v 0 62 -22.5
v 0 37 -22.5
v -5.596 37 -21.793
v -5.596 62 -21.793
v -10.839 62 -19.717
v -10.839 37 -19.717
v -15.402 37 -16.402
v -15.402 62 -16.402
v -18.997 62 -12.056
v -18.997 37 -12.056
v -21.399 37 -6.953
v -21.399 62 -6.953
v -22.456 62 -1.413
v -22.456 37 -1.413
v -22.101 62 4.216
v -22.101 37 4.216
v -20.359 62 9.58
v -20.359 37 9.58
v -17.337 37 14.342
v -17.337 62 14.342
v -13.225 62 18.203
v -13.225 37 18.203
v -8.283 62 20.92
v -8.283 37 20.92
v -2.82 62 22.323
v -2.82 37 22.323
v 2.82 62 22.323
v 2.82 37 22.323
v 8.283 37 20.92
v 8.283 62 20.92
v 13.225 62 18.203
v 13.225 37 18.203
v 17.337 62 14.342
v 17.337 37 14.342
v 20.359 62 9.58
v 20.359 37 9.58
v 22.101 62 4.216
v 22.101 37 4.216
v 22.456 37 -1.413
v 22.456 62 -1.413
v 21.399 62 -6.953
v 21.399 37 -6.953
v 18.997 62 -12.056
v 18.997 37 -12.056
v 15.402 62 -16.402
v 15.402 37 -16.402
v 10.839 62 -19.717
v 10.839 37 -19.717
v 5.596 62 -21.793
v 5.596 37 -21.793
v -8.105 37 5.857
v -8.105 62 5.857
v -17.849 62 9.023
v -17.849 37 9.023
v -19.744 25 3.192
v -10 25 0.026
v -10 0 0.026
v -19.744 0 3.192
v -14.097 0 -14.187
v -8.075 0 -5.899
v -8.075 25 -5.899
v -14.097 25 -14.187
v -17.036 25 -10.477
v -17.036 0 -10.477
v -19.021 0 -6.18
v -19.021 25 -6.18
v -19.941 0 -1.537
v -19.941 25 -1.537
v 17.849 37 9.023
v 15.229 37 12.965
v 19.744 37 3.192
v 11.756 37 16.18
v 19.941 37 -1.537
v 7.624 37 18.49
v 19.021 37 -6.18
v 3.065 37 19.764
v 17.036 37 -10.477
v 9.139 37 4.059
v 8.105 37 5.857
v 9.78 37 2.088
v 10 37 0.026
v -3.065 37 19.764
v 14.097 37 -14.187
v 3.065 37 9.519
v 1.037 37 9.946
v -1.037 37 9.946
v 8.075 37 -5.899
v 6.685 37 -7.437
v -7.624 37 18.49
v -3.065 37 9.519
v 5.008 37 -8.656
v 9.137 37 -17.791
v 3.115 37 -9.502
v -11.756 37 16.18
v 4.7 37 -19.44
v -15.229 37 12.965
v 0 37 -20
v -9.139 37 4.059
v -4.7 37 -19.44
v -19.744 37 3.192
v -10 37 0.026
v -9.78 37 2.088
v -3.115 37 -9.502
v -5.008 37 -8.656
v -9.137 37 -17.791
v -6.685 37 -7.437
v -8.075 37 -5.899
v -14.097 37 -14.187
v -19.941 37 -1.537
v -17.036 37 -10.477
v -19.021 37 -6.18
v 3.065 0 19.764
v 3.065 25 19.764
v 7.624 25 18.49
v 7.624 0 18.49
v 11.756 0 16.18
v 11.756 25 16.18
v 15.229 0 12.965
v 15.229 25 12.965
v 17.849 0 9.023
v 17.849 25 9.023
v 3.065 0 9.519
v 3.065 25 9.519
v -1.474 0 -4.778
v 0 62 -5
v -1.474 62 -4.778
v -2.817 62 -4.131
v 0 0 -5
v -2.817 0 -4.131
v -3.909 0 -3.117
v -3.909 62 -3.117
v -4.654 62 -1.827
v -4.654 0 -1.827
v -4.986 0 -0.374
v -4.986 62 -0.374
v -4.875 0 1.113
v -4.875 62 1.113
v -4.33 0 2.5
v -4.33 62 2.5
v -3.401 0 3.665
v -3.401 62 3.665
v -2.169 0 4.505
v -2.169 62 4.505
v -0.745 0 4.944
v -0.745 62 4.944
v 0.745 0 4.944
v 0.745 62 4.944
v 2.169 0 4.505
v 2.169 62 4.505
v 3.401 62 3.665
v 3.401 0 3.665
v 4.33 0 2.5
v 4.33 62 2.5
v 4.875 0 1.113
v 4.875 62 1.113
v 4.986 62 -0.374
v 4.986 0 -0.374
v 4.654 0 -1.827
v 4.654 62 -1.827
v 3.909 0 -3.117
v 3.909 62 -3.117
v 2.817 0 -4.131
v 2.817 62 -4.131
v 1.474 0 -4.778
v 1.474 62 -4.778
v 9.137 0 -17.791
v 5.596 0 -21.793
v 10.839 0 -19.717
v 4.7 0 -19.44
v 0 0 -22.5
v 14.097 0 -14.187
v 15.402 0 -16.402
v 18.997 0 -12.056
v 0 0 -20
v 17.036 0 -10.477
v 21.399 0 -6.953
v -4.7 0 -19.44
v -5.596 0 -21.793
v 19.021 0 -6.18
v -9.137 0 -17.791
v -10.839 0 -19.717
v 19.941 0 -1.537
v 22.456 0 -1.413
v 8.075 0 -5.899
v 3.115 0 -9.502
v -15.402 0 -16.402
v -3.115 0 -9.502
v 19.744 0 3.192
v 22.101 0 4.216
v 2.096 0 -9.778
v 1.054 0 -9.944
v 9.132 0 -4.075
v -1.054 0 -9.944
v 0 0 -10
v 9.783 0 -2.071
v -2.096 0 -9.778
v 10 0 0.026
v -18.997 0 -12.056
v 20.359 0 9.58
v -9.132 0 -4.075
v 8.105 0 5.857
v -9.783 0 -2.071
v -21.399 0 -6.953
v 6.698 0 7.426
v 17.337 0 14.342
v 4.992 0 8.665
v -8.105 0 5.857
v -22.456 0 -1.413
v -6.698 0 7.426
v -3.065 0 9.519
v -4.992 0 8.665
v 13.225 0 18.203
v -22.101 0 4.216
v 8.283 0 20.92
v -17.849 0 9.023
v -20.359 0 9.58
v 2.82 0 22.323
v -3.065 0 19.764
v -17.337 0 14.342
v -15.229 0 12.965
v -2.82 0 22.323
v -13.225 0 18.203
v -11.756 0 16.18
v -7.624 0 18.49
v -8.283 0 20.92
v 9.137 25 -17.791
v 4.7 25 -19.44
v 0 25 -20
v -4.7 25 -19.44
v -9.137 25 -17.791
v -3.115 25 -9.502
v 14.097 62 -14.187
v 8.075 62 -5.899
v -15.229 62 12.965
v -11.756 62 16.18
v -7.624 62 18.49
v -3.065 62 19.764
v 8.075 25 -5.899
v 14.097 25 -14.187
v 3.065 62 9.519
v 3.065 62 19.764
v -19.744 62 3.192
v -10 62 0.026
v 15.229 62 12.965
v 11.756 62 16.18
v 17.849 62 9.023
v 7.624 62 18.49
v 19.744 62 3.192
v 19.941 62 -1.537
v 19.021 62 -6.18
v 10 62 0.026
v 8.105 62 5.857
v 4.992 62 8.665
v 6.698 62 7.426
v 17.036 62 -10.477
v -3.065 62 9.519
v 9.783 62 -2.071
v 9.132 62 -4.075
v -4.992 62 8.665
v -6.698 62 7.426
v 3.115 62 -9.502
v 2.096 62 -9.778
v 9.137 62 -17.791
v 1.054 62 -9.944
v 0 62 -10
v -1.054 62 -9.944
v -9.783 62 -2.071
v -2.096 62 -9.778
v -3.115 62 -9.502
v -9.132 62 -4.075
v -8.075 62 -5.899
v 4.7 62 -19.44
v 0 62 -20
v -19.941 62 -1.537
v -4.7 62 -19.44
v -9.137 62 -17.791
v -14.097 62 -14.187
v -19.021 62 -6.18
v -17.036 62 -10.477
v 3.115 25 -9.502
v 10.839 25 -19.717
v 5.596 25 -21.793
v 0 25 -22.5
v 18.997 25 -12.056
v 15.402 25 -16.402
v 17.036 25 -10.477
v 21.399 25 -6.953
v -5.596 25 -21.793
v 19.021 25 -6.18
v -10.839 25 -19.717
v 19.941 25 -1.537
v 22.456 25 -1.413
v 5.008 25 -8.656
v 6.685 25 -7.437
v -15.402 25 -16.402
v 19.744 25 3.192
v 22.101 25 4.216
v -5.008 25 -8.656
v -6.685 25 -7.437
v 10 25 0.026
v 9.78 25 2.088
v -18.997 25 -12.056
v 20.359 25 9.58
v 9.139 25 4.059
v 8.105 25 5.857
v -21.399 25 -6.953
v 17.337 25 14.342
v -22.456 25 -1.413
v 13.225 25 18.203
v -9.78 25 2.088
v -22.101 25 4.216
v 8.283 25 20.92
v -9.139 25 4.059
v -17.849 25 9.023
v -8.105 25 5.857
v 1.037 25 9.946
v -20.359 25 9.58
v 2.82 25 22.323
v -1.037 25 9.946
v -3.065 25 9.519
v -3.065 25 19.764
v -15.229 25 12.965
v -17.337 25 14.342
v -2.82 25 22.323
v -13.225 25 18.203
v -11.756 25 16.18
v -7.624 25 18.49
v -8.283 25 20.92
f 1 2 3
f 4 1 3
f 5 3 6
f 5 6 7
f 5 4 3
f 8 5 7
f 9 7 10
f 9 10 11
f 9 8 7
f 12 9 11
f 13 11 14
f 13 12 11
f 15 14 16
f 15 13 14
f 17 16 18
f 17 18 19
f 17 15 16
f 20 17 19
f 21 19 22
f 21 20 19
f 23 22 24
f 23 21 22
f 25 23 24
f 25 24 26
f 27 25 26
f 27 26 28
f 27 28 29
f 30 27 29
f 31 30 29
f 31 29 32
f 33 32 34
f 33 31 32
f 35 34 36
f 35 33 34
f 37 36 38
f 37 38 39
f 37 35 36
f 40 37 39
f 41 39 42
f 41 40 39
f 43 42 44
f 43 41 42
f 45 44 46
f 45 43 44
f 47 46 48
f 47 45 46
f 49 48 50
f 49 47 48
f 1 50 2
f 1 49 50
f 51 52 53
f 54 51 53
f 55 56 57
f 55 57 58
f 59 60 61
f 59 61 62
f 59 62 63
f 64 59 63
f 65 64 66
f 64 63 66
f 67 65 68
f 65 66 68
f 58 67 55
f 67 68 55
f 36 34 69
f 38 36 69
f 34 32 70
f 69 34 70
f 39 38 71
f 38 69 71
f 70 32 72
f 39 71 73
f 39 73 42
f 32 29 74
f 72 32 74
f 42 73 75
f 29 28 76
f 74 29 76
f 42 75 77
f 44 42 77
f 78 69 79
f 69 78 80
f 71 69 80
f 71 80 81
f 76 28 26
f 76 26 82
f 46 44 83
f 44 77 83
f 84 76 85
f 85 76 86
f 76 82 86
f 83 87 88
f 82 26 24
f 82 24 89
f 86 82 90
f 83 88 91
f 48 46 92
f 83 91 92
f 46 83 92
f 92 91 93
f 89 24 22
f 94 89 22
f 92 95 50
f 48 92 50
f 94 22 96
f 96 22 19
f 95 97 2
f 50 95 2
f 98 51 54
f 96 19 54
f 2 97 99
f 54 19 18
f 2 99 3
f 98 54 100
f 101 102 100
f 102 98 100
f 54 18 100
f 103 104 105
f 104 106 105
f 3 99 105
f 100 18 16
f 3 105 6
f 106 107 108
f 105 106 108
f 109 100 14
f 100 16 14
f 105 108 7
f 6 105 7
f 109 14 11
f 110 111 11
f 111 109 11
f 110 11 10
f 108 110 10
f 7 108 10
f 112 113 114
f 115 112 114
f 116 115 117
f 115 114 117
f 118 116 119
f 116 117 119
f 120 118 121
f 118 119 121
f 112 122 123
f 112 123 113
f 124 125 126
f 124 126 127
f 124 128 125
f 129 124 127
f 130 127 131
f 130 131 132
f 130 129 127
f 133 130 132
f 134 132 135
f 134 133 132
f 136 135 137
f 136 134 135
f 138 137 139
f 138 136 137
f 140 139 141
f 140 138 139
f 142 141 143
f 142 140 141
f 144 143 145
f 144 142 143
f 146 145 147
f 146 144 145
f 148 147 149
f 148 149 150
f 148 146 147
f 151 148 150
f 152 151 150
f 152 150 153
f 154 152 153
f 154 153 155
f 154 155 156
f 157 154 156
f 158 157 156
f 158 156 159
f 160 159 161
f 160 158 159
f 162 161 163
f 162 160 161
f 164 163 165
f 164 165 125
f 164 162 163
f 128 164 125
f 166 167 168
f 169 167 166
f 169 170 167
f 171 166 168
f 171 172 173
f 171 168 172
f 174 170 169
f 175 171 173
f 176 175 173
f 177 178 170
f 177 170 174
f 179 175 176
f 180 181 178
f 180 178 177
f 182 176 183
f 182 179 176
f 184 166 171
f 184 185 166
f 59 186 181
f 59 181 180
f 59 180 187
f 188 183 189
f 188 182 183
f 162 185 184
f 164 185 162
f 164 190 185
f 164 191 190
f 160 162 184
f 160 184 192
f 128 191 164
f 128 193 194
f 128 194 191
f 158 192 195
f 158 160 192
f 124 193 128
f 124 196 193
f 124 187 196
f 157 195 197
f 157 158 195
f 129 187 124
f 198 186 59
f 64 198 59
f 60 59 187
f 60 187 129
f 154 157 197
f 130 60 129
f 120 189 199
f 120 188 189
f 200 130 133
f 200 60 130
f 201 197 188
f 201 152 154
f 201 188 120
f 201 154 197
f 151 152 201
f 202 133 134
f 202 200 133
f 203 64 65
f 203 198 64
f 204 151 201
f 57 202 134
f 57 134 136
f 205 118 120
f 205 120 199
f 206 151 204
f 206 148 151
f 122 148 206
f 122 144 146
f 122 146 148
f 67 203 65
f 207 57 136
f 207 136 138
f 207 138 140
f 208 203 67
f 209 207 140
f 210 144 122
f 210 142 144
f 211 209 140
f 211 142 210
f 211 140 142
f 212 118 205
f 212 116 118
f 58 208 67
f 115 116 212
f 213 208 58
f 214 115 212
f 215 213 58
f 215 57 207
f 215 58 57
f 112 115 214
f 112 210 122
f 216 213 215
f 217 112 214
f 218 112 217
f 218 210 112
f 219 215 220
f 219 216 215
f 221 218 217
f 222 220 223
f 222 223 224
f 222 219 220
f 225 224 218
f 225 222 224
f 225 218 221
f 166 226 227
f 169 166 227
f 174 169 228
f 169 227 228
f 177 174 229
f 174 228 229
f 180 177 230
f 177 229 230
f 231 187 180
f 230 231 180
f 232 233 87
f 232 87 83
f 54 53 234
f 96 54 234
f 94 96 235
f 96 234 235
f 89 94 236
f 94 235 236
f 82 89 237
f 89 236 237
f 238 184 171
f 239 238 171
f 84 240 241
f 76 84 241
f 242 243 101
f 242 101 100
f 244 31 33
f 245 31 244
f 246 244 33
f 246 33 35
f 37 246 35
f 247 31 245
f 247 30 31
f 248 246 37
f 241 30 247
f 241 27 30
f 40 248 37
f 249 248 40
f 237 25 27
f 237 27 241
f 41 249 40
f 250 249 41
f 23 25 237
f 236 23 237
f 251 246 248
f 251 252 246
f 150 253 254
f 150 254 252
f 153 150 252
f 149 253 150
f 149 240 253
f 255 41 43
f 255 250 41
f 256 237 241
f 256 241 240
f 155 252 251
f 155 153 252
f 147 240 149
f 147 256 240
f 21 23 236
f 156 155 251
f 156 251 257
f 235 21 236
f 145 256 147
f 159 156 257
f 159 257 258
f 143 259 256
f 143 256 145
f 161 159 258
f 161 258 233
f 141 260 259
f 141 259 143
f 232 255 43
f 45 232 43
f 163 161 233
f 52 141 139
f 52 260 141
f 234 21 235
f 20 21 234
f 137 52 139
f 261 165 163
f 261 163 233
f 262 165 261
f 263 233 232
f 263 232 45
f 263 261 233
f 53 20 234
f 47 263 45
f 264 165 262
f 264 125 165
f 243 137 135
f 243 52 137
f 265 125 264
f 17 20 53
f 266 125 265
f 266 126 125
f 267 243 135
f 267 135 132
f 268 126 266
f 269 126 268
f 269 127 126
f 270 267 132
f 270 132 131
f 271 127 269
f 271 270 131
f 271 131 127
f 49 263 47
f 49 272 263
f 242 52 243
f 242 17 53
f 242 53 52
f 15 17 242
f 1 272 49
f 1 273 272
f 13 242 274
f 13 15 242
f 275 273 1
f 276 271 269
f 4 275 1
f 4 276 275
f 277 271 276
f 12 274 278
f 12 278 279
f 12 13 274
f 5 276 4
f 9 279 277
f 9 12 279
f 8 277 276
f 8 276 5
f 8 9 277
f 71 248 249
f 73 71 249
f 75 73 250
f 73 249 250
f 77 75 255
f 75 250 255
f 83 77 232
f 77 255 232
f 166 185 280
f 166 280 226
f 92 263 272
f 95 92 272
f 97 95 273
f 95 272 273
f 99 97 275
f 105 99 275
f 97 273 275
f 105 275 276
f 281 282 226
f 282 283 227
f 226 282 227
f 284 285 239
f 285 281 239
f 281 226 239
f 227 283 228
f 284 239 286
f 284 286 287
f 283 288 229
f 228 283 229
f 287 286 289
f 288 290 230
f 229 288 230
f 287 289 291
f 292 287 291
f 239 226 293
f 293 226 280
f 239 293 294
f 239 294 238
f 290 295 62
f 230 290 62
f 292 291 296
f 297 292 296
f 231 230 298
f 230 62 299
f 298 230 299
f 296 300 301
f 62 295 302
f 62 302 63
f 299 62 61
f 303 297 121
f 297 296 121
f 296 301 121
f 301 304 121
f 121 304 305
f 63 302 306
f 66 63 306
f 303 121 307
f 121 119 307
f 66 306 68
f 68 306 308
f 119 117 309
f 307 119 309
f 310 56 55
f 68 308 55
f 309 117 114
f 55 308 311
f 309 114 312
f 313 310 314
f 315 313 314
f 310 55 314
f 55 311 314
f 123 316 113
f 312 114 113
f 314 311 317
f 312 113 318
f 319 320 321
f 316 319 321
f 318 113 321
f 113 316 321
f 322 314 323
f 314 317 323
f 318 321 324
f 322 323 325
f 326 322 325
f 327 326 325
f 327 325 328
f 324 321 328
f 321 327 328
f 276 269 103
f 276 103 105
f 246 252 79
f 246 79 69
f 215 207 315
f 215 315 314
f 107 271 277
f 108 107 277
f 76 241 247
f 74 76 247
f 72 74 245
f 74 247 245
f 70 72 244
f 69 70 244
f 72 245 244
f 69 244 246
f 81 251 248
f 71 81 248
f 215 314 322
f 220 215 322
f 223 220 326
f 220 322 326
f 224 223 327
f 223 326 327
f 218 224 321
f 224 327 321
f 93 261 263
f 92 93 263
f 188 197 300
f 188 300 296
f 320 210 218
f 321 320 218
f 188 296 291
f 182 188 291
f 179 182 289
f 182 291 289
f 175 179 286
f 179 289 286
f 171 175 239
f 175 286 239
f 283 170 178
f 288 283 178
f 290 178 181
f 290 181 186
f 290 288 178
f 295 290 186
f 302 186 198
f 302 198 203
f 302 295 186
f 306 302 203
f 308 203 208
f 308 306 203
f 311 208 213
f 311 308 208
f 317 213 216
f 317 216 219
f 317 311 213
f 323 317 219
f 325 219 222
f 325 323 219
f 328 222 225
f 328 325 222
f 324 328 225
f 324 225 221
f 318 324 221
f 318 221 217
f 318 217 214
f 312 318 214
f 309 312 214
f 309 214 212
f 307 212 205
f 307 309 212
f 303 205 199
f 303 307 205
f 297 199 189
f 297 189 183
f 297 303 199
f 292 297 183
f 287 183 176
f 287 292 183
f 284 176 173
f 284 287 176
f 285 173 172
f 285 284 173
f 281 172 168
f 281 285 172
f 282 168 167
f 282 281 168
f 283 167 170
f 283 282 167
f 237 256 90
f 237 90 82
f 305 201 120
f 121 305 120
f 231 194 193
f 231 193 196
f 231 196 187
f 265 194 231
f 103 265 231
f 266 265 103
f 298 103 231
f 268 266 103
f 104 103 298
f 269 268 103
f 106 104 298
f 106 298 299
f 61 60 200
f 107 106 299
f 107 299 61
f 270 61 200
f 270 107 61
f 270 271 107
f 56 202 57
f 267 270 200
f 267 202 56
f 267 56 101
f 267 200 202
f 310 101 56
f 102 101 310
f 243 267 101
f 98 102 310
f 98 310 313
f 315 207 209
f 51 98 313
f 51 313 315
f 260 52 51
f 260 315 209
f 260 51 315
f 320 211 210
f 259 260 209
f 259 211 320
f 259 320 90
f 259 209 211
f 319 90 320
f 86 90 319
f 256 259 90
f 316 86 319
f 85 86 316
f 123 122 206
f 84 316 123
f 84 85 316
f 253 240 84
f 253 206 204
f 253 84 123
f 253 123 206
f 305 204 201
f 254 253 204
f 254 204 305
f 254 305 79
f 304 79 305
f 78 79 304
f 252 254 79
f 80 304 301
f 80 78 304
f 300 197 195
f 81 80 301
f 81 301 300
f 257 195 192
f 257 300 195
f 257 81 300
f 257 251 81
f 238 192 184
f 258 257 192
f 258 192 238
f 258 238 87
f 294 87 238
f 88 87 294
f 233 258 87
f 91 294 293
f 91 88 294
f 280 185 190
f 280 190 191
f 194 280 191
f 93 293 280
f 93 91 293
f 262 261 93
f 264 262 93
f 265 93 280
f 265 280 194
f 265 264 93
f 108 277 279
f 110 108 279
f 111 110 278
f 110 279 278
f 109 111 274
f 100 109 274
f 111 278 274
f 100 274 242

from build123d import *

# Parameters (mm, degrees)
SKETCH1_W           = 2.5
SKETCH1_H           = 25
SKETCH2_W           = 6.130760382
SKETCH2_H           = 11
BOSS_EXTRUDE1_DEPTH = 25
CIRPATTERN1_COUNT   = 5
SKETCH3_W           = 6.130760382
SKETCH3_H           = 12
BOSS_EXTRUDE2_DEPTH = 25
CIRPATTERN2_COUNT   = 5


with BuildPart() as part:
    # Sketch1 → Revolve1 (revolve)
    with BuildSketch(Plane(origin=(0, 0, 0), x_dir=(0, 0, -1), z_dir=(1, 0, 0))):
        with Locations((21.25, 49.5)):
            Rectangle(SKETCH1_W, SKETCH1_H)
        with Locations((21.25, 12.5)):
            Rectangle(SKETCH1_W, SKETCH1_H)
        Polygon((5, 25), (5, 0), (10, 0), (10, 25), (10, 37), (10, 62), (5, 62), (5, 37), align=None)
        Polygon((5, 25), (5, 0), (10, 0), (10, 25), (10, 37), (10, 62), (5, 62), (5, 37), align=None)
    revolve(axis=Axis((0, 0, 0), (0, 1, 0)))

    # Sketch2 → Boss-Extrude1 (add)
    with BuildSketch(Plane.XZ):
        with Locations((0, 15.018584153)):
            Rectangle(SKETCH2_W, SKETCH2_H)
    boss_extrude1 = extrude(amount=-BOSS_EXTRUDE1_DEPTH)

    # CirPattern1: Boss-Extrude1 ×5 about axis
    cirpattern1_axis = Axis((0, 0, 0), (0, 1, 0))
    for i in range(1, CIRPATTERN1_COUNT):
        add(boss_extrude1.rotate(cirpattern1_axis, i * 360 / CIRPATTERN1_COUNT))

    # Sketch3 → Boss-Extrude2 (add)
    with BuildSketch(Plane(origin=(0, 62, 0), x_dir=(-1, 0, 0), z_dir=(0, 1, 0))):
        with Locations((0, 14.863932977)):
            Rectangle(SKETCH3_W, SKETCH3_H)
    boss_extrude2 = extrude(amount=-BOSS_EXTRUDE2_DEPTH)

    # CirPattern2: Boss-Extrude2 ×5 about axis
    cirpattern2_axis = Axis((0, 0, 0), (0, 1, 0))
    for i in range(1, CIRPATTERN2_COUNT):
        add(boss_extrude2.rotate(cirpattern2_axis, i * 360 / CIRPATTERN2_COUNT))


solid = part.part
